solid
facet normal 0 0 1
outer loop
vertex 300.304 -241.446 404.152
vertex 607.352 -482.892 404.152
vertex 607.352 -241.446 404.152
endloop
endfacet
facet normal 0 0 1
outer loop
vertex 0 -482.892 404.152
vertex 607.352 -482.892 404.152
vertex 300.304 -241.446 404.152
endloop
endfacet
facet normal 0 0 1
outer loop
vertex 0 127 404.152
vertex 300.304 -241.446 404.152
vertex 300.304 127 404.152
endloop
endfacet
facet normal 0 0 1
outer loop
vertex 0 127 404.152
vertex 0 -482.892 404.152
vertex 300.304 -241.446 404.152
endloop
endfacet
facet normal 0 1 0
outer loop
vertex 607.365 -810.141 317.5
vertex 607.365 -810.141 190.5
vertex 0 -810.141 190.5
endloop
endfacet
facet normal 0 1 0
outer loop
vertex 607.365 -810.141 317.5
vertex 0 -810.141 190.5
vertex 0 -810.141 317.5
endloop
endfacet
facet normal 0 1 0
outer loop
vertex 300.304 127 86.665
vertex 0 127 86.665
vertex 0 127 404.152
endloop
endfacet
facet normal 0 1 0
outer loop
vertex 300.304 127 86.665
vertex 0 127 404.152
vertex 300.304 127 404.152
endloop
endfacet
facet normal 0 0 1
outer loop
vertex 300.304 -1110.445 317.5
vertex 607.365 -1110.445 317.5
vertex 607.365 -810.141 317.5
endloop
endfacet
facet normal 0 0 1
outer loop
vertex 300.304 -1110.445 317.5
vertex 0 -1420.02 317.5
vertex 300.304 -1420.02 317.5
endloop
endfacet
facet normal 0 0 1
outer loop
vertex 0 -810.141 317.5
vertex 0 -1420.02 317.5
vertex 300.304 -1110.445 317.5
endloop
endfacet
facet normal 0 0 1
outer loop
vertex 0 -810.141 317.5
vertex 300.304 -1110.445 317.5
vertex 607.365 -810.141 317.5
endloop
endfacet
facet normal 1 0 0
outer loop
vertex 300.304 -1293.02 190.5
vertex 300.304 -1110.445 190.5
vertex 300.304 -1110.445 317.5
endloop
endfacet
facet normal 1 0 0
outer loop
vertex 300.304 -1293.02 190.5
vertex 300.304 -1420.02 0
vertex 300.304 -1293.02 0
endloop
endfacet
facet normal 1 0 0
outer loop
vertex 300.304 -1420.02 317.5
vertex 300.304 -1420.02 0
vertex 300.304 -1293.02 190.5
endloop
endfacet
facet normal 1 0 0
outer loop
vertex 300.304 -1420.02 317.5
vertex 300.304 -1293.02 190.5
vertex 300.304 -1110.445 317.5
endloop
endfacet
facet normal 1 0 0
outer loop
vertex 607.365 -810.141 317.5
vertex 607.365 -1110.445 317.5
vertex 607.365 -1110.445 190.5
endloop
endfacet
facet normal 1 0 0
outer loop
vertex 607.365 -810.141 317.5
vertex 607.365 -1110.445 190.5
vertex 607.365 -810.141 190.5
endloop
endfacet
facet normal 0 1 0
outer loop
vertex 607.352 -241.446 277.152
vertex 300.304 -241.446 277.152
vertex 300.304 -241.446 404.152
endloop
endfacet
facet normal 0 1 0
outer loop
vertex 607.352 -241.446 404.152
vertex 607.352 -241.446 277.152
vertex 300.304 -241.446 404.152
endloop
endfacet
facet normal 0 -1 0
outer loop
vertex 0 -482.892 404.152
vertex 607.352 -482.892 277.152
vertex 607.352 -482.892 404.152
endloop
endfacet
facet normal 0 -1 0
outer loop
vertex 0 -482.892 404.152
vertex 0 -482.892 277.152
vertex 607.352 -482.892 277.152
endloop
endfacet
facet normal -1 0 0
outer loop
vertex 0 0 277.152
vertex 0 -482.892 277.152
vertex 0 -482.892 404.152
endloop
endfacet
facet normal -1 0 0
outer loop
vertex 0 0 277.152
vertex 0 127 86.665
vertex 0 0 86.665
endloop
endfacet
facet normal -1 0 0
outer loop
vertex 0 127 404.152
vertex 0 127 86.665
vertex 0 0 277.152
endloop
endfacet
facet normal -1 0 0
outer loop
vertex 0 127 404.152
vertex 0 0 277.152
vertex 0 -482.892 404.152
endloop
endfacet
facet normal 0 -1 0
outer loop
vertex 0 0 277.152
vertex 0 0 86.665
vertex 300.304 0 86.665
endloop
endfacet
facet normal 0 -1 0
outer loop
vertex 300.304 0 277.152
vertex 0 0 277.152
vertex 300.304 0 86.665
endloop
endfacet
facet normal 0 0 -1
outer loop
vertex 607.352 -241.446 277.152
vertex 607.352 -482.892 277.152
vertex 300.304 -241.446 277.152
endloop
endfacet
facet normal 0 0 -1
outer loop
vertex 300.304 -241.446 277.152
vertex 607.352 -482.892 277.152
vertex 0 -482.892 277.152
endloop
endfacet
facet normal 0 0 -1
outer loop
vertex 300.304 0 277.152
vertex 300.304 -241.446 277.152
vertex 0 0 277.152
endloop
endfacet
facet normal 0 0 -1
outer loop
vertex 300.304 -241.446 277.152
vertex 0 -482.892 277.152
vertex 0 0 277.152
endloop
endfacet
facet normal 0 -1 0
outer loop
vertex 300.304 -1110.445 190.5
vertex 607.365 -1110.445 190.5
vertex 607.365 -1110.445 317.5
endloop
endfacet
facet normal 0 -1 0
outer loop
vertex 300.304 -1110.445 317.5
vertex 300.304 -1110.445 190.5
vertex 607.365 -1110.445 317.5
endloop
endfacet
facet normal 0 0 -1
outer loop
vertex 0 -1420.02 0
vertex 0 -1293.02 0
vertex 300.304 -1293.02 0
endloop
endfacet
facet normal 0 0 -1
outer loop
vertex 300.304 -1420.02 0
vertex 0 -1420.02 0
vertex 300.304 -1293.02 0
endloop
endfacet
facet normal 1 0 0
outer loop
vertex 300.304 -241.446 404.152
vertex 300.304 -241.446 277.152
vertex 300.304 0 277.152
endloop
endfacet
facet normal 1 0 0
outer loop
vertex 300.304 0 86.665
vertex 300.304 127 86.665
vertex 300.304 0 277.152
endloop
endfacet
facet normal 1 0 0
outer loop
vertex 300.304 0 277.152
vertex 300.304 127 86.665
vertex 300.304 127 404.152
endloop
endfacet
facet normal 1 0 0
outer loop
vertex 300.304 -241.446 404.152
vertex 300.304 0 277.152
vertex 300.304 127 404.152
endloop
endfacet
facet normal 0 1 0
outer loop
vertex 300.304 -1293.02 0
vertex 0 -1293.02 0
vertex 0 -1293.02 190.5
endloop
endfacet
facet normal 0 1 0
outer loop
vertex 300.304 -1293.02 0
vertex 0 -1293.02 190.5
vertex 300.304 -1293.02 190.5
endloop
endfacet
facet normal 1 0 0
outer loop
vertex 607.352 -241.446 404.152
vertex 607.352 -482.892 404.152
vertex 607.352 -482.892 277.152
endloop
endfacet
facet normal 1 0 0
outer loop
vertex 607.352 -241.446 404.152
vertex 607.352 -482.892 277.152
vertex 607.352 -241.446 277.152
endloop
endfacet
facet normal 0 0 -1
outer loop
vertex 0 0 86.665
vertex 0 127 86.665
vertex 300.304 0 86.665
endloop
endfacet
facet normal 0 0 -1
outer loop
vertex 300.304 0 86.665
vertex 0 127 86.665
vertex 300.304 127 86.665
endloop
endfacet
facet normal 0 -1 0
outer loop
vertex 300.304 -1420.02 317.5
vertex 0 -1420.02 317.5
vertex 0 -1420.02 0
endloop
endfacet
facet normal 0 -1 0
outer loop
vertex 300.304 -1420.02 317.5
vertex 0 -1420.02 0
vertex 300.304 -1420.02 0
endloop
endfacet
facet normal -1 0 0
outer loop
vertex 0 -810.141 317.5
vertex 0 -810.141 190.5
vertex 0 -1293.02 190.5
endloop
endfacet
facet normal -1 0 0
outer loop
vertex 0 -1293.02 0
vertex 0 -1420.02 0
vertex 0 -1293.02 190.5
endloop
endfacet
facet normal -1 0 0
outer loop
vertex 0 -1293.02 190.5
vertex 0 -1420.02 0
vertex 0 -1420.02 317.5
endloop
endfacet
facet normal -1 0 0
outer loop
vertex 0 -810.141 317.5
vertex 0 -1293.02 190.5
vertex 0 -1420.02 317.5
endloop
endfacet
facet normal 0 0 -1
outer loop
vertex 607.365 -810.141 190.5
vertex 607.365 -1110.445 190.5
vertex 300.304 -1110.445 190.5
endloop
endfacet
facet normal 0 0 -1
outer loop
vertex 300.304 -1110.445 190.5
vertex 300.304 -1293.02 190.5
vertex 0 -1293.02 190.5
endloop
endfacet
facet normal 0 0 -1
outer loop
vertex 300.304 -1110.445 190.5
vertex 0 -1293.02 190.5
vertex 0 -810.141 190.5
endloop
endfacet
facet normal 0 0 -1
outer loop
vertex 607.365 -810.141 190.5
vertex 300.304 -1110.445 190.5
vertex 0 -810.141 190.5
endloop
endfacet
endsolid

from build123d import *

# Parameters (mm, degrees)
F0_W      = 300.3042
F0_H      = 127
F1_DEPTH  = 404.1521
F2_W      = 300.3042
F2_H      = 127
F3_DEPTH  = 396.24
F4_DEPTH  = 86.6521
F5_W      = 241.44605
F5_H      = 127
F6_DEPTH  = 307.0479
F7_DEPTH  = 86.6648
F8_W      = 300.3042
F8_H      = 127
F9_DEPTH  = 317.5
F10_W     = 300.3042
F10_H     = 127
F11_DEPTH = 482.8794
F12_W     = 300.3042
F12_H     = 127
F13_DEPTH = 307.0606


with BuildPart() as f1:
    # F0 (on Top) → F1 (new body)
    with BuildSketch(Plane.XY):
        with Locations((150.1521, 63.5)):
            Rectangle(F0_W, F0_H)
    extrude(amount=F1_DEPTH)

    # F2 (on face) → F3 (join)
    with BuildSketch(Plane.XZ):
        with Locations((150.1521, 340.6521)):
            Rectangle(F2_W, F2_H)
    extrude(amount=F3_DEPTH)

    # F4 (add): a face of the model
    f4_faces = [f1.faces().sort_by_distance(p)[0] for p in [
        (150.1521, -396.24, 340.6521),
    ]]
    extrude(f4_faces, amount=F4_DEPTH)

    # F5 (on face) → F6 (join)
    with BuildSketch(Plane.YZ.offset(300.3042)):
        with Locations((-362.169075, 340.6521)):
            Rectangle(F5_W, F5_H)
    extrude(amount=F6_DEPTH)

    # F7 (cut): a face of the model
    f7_faces = [f1.faces().sort_by_distance(p)[0] for p in [
        (150.1521, 63.5, 0),
    ]]
    extrude(f7_faces, amount=-F7_DEPTH, mode=Mode.SUBTRACT)


with BuildPart() as f9:
    # F8 (on Top) → F9 (new body)
    with BuildSketch(Plane.XY):
        with Locations((150.1521, -1356.5204610825)):
            Rectangle(F8_W, F8_H)
    extrude(amount=F9_DEPTH)

    # F10 (on face) → F11 (join)
    with BuildSketch(Plane(origin=(0, -1293.0204610825, 0), x_dir=(-1, 0, 0), z_dir=(0, 1, 0))):
        with Locations((-150.1521, 254)):
            Rectangle(F10_W, F10_H)
    extrude(amount=F11_DEPTH)

    # F12 (on face) → F13 (join)
    with BuildSketch(Plane.YZ.offset(300.3042)):
        with Locations((-960.2931610825, 254)):
            Rectangle(F12_W, F12_H)
    extrude(amount=F13_DEPTH)


solid = Compound([f1.part, f9.part])
